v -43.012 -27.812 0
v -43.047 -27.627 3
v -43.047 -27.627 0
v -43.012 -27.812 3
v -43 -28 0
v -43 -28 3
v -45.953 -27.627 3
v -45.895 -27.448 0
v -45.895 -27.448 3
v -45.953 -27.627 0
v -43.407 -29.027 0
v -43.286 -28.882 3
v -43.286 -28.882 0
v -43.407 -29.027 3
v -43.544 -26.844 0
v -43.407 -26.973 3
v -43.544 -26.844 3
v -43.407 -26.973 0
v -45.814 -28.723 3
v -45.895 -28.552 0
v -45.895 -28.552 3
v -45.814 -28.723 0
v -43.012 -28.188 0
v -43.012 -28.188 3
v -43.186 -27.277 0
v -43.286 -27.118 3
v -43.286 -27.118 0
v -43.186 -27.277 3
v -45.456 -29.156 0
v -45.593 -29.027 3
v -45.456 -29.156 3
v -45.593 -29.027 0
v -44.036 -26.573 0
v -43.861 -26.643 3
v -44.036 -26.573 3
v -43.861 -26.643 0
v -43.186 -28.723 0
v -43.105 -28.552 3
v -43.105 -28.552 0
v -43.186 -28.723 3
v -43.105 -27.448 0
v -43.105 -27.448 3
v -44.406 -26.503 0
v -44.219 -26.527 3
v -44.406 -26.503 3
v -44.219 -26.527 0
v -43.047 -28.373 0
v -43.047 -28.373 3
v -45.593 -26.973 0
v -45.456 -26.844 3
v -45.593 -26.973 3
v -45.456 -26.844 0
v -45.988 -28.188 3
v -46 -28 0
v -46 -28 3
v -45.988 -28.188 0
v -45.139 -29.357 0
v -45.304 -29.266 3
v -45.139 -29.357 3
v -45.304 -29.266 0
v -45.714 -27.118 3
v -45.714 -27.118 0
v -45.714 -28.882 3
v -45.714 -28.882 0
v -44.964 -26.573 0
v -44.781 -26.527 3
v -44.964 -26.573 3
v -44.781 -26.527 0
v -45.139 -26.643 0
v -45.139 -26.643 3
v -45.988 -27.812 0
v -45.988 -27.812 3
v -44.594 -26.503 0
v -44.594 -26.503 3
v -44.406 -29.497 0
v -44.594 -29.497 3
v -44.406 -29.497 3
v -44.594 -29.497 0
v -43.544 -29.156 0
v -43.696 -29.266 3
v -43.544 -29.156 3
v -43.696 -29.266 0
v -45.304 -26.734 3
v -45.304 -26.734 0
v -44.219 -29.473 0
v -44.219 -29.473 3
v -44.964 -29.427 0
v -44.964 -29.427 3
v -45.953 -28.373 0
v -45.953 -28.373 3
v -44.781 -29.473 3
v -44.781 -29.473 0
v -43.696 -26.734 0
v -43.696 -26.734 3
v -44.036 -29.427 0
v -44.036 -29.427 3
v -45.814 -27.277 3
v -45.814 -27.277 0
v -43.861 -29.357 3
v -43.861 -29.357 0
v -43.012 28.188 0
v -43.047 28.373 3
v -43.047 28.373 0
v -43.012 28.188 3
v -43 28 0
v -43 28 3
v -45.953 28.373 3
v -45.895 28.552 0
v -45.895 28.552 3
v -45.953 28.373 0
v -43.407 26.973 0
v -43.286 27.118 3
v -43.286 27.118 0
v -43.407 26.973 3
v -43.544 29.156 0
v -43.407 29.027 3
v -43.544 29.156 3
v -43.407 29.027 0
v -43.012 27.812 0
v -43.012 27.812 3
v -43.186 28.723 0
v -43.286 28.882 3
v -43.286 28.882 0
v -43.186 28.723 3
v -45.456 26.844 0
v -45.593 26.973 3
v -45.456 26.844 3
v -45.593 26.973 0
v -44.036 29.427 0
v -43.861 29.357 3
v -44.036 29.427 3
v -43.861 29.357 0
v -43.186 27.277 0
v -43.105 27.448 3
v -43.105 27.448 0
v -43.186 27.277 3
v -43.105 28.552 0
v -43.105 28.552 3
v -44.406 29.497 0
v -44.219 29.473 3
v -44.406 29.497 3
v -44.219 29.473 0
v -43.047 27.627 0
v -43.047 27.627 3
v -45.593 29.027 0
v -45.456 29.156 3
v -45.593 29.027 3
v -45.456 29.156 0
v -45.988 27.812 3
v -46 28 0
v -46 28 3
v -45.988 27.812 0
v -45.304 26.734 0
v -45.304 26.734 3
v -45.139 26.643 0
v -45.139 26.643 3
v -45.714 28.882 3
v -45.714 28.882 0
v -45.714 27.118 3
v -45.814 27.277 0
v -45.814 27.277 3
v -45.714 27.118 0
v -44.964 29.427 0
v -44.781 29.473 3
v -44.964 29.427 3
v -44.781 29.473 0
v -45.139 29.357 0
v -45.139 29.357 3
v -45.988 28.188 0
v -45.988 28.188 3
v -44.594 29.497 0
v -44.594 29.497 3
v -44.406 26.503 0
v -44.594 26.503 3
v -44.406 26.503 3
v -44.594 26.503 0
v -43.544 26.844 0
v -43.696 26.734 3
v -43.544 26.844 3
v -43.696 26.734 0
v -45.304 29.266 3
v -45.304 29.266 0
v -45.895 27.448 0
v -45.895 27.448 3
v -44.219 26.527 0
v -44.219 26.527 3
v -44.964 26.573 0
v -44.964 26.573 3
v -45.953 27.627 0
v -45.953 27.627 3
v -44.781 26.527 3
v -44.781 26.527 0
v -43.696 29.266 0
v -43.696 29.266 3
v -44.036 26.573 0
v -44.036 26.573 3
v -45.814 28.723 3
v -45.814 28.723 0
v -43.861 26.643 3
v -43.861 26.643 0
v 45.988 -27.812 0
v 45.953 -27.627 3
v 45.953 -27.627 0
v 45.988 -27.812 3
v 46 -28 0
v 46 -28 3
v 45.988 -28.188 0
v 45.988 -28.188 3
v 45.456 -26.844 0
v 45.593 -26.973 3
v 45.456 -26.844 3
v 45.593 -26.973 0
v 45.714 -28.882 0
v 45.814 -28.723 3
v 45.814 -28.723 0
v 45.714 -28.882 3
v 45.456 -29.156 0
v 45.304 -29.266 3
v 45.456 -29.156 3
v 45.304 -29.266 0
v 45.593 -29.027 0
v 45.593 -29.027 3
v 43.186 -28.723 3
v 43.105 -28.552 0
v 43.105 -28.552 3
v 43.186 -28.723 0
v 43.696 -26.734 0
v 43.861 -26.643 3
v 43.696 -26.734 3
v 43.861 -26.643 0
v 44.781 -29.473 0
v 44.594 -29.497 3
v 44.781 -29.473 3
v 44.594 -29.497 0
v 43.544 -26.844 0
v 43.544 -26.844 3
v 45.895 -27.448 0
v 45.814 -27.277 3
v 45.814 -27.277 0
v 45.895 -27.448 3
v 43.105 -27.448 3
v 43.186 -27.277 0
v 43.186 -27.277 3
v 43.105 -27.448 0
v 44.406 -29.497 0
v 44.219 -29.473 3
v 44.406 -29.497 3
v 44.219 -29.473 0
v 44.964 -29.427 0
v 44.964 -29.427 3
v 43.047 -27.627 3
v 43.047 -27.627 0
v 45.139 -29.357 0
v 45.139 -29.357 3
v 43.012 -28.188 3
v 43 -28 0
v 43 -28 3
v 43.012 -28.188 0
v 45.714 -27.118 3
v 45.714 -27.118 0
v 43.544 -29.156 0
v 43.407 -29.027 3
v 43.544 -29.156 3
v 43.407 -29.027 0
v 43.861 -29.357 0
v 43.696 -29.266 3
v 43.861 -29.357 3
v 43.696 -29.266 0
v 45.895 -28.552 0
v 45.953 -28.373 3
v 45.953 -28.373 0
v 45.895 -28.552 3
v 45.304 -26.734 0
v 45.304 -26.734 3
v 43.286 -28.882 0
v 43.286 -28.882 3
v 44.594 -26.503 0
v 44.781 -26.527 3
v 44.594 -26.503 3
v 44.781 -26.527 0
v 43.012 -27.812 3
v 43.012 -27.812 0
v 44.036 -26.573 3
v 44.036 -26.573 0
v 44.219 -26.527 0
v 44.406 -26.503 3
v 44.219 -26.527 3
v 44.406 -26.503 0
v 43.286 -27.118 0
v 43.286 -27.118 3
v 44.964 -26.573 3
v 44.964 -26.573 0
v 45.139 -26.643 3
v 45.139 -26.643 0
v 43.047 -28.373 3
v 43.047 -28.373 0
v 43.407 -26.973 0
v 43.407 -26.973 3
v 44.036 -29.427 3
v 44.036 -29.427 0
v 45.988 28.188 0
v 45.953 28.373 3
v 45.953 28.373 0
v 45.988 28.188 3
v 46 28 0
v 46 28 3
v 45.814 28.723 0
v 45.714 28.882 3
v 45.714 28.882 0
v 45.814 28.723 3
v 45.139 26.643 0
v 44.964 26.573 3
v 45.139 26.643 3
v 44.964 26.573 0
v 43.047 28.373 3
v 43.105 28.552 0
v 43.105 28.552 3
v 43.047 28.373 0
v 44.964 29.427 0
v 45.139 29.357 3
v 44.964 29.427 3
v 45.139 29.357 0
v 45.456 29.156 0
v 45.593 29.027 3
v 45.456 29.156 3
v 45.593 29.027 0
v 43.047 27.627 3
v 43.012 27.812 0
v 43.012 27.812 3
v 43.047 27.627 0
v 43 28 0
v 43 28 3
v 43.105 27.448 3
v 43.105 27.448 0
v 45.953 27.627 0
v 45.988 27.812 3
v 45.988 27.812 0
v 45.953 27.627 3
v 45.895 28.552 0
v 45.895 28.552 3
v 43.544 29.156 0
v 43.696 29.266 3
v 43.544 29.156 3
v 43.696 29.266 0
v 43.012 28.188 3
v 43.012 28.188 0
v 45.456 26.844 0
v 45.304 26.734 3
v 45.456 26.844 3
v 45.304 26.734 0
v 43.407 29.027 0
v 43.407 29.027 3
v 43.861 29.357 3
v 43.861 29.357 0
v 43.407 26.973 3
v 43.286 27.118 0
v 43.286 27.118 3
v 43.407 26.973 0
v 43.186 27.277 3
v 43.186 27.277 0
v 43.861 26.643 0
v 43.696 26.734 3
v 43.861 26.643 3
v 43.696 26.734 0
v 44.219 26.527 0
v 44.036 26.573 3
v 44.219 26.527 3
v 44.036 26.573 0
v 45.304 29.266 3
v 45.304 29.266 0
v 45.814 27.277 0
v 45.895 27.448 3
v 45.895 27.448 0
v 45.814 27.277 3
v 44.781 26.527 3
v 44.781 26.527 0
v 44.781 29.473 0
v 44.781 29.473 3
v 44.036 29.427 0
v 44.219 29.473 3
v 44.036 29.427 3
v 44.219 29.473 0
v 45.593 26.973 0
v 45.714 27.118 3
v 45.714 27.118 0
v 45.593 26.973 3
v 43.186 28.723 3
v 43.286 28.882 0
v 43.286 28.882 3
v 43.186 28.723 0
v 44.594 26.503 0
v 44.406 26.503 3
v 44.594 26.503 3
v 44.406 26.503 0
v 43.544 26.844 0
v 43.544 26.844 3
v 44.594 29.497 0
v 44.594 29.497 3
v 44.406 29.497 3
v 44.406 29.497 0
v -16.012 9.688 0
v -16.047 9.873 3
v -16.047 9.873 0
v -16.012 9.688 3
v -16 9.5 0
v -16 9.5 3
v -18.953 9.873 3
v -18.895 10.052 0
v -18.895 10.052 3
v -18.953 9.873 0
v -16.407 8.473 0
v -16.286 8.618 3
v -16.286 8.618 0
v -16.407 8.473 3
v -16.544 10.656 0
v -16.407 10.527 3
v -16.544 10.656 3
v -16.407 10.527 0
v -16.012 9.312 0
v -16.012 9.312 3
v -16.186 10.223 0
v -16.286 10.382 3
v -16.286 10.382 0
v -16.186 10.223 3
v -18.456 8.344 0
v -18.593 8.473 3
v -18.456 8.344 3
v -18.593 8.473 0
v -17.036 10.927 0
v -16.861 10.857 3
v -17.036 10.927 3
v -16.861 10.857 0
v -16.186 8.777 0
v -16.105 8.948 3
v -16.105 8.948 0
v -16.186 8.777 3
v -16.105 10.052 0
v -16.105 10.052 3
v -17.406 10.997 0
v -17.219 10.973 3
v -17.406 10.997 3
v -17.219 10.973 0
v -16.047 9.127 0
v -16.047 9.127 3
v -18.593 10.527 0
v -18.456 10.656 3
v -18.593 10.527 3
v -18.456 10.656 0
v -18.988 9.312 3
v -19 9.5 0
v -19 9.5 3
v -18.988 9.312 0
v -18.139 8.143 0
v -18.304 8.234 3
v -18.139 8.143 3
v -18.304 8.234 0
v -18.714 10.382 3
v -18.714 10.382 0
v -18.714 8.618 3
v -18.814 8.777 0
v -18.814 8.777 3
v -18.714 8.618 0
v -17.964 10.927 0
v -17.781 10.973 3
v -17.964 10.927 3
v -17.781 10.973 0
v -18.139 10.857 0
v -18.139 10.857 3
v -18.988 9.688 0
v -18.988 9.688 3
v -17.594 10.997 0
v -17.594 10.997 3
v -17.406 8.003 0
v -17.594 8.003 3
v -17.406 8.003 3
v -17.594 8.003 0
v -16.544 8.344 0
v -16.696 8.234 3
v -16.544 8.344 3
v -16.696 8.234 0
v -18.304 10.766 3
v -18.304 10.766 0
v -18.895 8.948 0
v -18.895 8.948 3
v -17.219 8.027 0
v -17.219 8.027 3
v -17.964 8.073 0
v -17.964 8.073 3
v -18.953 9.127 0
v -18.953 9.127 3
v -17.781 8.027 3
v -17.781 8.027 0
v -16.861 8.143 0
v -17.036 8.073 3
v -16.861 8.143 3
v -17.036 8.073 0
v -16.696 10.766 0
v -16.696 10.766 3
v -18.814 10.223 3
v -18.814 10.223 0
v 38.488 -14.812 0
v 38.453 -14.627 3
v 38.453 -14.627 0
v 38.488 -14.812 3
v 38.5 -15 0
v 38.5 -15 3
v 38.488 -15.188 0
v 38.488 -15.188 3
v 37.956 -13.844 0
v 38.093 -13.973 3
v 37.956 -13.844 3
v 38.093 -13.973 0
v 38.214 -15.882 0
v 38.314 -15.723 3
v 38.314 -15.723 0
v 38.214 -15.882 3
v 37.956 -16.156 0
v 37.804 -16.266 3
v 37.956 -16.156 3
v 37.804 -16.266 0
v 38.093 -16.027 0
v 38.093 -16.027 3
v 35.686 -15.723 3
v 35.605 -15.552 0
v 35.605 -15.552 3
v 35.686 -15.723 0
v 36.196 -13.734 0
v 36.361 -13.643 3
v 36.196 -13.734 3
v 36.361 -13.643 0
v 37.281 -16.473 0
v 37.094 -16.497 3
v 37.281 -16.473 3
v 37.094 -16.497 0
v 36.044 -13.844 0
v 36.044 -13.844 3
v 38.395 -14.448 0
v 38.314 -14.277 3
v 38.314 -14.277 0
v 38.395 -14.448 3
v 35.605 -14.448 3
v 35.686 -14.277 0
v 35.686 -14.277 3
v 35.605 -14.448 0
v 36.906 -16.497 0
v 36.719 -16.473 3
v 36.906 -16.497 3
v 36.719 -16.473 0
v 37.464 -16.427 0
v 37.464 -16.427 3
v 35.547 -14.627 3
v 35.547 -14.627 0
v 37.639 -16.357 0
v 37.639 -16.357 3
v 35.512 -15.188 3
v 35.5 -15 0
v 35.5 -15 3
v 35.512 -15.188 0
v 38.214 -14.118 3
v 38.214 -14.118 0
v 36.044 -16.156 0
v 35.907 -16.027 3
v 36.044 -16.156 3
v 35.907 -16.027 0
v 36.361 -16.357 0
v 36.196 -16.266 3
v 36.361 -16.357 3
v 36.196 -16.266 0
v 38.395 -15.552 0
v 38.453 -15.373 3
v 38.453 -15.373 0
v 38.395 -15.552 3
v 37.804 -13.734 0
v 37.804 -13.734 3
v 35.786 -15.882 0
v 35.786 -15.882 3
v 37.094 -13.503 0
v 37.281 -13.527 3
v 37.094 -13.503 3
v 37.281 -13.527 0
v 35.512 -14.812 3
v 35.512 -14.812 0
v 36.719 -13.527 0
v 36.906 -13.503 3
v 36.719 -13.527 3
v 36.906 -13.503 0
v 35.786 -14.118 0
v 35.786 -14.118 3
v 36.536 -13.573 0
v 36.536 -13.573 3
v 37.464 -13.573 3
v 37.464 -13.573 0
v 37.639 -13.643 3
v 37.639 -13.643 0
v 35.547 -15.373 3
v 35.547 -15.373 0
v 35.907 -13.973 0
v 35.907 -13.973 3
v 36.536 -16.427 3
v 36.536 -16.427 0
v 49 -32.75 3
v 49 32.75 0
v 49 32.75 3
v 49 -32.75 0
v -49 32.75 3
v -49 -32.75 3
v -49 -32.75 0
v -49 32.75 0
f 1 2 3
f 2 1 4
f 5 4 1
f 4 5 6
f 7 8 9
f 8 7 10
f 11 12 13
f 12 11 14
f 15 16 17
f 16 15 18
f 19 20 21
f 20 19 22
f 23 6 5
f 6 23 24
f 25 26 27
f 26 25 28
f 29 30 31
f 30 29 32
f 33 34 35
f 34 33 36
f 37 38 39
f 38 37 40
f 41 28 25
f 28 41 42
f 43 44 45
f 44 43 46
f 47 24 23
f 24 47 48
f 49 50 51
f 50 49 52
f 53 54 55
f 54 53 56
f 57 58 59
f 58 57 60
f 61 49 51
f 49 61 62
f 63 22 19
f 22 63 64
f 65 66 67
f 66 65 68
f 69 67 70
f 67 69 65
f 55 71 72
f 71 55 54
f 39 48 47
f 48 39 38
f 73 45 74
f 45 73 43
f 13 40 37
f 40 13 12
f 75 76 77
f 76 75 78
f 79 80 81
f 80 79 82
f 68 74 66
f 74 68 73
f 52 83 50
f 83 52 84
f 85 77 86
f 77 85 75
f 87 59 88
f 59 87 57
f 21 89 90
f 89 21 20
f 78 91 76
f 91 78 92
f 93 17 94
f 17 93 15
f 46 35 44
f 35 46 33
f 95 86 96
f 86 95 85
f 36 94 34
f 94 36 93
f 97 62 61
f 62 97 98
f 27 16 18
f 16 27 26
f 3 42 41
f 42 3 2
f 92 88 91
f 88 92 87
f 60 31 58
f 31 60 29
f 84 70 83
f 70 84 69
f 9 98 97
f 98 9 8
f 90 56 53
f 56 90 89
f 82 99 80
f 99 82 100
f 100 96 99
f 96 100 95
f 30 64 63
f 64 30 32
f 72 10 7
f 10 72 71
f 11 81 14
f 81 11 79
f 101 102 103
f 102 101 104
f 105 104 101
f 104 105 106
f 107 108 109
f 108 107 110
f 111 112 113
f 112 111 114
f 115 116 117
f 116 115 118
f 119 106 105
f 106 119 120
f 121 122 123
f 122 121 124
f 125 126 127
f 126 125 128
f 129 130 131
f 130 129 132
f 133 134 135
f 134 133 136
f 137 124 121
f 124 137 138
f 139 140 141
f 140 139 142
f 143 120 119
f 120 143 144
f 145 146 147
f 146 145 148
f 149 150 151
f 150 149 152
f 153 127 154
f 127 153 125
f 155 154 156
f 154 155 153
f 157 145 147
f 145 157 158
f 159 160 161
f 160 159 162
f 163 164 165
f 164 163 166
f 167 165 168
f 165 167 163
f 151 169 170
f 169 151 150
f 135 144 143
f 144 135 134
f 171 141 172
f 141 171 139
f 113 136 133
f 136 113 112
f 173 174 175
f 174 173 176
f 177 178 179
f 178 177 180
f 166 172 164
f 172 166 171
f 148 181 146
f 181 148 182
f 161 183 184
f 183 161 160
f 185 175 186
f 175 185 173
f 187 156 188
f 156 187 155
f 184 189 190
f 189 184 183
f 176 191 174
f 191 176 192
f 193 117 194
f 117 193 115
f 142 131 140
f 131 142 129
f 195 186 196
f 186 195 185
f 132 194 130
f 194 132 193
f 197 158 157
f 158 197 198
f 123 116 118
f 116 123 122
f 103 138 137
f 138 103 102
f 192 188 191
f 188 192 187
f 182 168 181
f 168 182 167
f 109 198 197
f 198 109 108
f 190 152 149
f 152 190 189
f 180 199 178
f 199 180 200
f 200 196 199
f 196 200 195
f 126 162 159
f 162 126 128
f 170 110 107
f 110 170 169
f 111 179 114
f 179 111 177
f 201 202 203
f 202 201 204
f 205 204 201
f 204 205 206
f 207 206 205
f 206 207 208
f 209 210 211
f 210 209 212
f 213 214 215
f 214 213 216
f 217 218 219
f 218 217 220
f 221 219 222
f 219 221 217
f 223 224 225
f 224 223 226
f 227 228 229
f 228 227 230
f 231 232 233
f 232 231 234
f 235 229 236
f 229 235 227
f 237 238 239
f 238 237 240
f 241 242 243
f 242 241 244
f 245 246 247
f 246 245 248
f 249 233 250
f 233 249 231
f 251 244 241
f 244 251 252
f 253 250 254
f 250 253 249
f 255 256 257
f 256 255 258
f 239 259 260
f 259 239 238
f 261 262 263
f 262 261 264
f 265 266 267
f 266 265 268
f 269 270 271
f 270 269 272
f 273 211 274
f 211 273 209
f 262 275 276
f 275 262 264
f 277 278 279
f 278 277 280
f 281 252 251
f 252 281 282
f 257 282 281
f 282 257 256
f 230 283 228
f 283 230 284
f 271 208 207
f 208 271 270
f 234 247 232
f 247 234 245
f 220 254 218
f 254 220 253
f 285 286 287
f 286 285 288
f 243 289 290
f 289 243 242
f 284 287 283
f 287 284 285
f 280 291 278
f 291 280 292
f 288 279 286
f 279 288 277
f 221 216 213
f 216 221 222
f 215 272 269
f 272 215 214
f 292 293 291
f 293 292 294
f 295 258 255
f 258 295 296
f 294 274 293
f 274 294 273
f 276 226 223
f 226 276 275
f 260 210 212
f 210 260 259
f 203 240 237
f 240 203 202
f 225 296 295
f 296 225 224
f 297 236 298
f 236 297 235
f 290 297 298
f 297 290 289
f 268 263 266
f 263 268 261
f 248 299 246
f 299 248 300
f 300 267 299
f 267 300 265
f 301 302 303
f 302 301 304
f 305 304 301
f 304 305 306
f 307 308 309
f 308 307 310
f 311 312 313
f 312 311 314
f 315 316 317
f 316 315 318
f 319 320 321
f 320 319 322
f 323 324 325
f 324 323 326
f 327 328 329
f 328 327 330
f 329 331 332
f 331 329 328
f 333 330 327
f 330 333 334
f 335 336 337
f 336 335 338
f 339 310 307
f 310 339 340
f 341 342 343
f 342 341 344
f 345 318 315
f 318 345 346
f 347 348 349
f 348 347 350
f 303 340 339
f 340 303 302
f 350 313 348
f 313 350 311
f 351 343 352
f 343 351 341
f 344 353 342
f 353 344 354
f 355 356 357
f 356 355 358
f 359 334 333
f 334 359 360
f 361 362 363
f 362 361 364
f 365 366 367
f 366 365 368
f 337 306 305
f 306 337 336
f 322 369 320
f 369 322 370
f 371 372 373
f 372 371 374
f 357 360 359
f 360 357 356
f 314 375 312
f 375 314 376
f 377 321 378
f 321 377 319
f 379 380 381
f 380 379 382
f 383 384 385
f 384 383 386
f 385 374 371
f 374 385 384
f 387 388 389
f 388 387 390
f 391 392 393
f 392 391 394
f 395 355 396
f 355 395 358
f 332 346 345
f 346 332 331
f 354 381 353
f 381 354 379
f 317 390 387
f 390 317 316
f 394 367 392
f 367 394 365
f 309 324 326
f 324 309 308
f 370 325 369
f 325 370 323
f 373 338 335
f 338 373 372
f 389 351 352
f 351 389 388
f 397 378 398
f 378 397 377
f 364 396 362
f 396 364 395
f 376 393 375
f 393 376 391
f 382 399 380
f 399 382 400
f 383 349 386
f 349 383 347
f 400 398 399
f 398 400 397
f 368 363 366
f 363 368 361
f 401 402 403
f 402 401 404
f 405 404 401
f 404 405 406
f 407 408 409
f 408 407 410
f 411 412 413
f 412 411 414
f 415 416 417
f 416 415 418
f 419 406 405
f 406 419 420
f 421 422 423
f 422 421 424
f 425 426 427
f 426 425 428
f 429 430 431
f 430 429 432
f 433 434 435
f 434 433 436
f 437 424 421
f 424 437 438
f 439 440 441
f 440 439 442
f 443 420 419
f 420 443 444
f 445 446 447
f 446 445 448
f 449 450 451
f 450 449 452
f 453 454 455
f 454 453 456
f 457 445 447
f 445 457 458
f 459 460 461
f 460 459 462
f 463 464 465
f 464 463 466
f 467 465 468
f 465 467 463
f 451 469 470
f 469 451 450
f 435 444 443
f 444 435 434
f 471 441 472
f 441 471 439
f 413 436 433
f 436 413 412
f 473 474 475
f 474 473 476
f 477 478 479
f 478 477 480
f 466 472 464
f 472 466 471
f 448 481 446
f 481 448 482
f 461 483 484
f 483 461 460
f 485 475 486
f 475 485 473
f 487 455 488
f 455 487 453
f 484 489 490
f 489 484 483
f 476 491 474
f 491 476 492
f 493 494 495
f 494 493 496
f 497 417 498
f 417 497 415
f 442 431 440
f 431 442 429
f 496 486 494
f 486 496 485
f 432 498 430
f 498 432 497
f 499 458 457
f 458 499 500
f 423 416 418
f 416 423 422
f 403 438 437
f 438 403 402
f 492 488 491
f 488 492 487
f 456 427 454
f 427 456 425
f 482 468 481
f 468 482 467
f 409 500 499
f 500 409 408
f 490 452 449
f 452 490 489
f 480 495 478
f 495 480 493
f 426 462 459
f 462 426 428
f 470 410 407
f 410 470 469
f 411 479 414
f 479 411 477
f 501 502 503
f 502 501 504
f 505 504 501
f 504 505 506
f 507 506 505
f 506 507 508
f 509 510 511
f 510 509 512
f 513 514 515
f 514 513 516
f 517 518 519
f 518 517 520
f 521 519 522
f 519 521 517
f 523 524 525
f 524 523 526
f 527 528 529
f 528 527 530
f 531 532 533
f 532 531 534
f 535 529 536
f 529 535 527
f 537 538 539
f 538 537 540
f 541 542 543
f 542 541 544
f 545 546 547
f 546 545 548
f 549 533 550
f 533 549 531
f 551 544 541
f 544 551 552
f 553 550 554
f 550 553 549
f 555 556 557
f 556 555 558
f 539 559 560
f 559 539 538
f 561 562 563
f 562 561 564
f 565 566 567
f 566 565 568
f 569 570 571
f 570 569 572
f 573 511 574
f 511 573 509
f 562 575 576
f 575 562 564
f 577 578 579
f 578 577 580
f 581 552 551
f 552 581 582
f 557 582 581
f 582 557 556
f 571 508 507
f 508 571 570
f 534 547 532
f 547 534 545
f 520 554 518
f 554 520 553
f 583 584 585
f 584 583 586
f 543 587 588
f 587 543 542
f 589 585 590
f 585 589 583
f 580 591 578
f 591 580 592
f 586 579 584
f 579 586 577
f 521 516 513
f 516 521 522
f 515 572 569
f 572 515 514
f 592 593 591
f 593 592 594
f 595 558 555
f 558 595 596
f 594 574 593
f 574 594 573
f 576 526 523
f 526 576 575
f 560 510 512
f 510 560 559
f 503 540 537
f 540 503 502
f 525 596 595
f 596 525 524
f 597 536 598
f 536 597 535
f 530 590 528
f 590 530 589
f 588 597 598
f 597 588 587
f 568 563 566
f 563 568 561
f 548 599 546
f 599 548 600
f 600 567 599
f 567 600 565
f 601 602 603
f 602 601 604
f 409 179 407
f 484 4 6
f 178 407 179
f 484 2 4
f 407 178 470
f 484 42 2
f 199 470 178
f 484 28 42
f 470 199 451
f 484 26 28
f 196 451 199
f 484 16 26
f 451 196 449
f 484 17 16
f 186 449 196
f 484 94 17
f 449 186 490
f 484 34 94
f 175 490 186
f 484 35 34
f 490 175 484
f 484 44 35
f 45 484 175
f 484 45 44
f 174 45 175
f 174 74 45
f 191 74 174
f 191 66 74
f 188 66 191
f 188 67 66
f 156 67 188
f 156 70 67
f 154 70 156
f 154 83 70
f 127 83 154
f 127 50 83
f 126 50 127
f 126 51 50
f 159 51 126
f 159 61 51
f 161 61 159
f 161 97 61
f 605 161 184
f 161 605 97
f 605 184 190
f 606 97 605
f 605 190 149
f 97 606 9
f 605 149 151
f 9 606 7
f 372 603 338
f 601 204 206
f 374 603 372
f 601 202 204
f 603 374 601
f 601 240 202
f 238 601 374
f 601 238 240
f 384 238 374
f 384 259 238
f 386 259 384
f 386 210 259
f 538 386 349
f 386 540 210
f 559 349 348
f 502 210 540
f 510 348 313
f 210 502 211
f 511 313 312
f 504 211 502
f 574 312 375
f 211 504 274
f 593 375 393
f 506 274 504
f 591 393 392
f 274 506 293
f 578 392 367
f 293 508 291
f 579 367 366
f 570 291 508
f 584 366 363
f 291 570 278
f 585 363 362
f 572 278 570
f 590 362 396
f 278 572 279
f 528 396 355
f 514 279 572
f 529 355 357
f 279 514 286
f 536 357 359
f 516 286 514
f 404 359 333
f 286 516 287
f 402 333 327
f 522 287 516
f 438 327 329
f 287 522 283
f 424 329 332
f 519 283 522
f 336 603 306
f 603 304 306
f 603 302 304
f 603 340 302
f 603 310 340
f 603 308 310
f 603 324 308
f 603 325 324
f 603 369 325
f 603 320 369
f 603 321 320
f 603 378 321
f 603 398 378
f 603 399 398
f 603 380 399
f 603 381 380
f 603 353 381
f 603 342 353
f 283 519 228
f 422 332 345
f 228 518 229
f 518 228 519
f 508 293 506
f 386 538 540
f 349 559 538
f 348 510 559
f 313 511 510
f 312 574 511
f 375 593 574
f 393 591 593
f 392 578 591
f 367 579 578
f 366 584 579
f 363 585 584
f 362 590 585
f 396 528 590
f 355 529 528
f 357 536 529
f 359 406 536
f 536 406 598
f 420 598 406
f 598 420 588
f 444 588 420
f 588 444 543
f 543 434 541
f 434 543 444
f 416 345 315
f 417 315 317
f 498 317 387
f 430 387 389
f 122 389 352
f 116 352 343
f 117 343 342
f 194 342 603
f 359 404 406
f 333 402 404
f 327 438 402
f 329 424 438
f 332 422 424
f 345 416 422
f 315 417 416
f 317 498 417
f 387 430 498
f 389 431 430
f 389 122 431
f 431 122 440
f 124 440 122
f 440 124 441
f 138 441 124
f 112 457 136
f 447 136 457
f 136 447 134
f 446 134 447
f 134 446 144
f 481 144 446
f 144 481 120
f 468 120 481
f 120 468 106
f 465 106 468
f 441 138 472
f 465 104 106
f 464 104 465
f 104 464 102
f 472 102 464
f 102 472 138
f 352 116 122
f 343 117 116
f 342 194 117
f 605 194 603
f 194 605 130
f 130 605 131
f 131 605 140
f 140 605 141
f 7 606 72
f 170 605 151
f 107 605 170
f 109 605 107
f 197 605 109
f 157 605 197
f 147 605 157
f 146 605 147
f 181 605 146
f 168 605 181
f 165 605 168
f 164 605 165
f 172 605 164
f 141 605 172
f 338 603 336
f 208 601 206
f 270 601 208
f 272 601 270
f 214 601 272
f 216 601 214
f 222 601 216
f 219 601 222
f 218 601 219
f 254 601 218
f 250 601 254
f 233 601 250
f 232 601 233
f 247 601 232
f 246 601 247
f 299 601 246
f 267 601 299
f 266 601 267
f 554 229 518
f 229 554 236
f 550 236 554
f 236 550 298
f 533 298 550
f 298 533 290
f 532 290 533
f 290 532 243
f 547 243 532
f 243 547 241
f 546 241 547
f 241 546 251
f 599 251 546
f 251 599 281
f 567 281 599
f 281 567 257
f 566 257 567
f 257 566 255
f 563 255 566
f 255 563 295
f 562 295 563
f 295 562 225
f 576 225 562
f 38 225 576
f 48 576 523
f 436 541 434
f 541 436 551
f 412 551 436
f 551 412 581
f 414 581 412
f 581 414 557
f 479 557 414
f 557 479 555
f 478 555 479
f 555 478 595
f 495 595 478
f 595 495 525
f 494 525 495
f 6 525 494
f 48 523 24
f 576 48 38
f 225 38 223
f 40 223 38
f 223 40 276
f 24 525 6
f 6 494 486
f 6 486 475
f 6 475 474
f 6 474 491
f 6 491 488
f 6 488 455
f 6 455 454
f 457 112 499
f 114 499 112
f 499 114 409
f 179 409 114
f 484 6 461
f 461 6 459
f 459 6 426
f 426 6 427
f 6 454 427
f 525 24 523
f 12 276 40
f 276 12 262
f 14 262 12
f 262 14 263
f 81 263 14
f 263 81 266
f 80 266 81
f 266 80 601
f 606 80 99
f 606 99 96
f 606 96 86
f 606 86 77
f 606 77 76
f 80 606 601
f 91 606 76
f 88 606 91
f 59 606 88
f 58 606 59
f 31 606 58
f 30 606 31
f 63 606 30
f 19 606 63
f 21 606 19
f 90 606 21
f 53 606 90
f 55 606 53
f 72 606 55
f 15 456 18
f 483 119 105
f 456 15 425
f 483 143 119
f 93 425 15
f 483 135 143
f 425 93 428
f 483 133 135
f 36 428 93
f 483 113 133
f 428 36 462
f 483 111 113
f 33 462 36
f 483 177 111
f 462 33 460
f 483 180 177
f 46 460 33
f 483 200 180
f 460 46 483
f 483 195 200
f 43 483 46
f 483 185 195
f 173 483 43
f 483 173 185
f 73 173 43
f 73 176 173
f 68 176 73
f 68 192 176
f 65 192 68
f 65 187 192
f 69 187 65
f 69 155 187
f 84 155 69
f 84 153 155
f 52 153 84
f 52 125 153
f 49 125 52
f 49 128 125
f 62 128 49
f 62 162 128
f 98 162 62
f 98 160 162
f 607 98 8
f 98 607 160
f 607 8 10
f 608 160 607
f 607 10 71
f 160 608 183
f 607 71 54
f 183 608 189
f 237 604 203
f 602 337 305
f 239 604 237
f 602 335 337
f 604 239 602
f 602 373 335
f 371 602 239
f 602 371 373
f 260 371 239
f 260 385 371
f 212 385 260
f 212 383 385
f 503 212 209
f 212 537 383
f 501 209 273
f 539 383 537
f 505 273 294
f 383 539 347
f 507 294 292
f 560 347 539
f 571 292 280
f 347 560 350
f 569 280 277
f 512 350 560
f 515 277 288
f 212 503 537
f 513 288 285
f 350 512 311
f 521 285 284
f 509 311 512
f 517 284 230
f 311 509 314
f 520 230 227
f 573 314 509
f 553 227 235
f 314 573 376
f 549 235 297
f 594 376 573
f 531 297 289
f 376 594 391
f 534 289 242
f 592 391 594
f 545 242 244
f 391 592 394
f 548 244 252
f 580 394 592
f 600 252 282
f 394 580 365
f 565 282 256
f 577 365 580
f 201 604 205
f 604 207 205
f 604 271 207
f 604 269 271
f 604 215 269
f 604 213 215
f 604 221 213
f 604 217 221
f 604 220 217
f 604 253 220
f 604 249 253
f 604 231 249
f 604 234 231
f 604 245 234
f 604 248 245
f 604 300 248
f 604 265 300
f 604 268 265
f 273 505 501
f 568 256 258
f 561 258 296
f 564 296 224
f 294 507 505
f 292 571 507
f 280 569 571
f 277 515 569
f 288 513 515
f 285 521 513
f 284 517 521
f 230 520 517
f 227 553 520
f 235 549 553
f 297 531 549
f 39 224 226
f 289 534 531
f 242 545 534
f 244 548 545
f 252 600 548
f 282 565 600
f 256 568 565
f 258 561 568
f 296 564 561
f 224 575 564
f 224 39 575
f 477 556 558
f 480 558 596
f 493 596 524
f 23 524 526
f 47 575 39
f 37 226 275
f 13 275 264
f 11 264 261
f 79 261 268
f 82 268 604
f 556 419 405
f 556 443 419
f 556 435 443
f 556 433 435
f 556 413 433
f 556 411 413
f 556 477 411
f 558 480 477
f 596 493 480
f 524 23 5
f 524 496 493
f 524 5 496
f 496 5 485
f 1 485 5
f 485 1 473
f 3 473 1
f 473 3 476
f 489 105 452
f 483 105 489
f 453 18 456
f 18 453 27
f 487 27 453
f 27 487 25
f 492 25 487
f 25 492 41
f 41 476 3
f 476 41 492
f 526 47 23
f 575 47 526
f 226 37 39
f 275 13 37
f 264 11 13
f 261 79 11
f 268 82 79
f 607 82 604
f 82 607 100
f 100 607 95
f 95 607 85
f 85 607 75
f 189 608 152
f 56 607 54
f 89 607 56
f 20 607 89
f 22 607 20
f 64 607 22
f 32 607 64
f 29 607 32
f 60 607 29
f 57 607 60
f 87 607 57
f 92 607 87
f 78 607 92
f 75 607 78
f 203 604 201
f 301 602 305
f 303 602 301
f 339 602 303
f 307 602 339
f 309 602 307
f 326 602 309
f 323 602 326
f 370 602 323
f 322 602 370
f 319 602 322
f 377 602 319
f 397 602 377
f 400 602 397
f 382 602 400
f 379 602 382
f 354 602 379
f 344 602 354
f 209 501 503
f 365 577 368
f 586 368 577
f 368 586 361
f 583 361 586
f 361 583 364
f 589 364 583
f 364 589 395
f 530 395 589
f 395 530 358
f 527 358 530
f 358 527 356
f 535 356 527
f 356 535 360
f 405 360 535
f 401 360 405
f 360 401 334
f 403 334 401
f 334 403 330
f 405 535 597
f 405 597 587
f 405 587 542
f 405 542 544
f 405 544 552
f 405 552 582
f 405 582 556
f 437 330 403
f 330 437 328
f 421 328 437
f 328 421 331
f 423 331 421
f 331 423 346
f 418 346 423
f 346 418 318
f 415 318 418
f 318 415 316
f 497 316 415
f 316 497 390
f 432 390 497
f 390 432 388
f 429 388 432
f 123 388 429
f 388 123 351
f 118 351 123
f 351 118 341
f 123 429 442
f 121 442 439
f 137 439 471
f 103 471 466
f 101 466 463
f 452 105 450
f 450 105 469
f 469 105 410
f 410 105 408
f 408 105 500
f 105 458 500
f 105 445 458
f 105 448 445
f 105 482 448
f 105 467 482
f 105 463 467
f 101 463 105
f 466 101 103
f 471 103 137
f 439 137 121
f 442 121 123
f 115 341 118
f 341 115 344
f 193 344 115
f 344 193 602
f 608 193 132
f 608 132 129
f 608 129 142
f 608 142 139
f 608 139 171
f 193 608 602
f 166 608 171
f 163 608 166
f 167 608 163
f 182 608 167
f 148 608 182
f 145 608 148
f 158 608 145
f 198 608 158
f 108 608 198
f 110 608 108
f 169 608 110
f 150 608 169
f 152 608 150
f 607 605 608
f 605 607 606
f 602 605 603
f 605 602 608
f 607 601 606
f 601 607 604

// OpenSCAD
// Raspicam for Pibow (model B)
// A raspicam support for the Pibow case (Pimoroni).

// Copyright (c) 2014 Jérémie DECOCK <jd.jdhp@gmail.com>

// PIBOW BASE ///////////////////////////////

// Pibow for RPi model B: 
//     Dimensions (mm): 98 x 65.5 x 18
//
// RPi and pibow screws:
//     Diameter: 3 mm
module pibow_b_base(board_width,
                    board_depth,
                    board_height) {

    // Check vars
    if(board_width < 98)   echo("WARNING: board_width should be greater than or equal to 98");
    if(board_depth < 65.5) echo("WARNING: board_depth should be greater than or equal to 65.5");

    // Local const
    screw_radius = 1.5;
    screw_spacing_x = 89;
    screw_spacing_y = 56;

    difference() {
        cube([board_width, board_depth, board_height], center=true);

        #union() {
            // Four screw holes
            for (i = [-1, 1]) {    
                for (j = [-1, 1]) {    
                    translate([i*screw_spacing_x/2, j*screw_spacing_y/2, 0]) {        
                        cylinder(r=screw_radius, h=board_height+1, center=true, $fn=50);
                    }
                }
            }

            // RPi screw holes
            translate([-17.5, 9.5, 0]) cylinder(r=screw_radius, h=board_height+1, center=true, $fn=50);
            translate([37, -15, 0])    cylinder(r=screw_radius, h=board_height+1, center=true, $fn=50);
        }
    }
}

/////////////////////////////////////////////

board_width=98;      // x
board_depth=65.5;    // y
board_height=3;      // z

translate([0, 0, board_height/2]) {
    pibow_b_base(board_width  = board_width,
                 board_depth  = board_depth,
                 board_height = board_height);
}
